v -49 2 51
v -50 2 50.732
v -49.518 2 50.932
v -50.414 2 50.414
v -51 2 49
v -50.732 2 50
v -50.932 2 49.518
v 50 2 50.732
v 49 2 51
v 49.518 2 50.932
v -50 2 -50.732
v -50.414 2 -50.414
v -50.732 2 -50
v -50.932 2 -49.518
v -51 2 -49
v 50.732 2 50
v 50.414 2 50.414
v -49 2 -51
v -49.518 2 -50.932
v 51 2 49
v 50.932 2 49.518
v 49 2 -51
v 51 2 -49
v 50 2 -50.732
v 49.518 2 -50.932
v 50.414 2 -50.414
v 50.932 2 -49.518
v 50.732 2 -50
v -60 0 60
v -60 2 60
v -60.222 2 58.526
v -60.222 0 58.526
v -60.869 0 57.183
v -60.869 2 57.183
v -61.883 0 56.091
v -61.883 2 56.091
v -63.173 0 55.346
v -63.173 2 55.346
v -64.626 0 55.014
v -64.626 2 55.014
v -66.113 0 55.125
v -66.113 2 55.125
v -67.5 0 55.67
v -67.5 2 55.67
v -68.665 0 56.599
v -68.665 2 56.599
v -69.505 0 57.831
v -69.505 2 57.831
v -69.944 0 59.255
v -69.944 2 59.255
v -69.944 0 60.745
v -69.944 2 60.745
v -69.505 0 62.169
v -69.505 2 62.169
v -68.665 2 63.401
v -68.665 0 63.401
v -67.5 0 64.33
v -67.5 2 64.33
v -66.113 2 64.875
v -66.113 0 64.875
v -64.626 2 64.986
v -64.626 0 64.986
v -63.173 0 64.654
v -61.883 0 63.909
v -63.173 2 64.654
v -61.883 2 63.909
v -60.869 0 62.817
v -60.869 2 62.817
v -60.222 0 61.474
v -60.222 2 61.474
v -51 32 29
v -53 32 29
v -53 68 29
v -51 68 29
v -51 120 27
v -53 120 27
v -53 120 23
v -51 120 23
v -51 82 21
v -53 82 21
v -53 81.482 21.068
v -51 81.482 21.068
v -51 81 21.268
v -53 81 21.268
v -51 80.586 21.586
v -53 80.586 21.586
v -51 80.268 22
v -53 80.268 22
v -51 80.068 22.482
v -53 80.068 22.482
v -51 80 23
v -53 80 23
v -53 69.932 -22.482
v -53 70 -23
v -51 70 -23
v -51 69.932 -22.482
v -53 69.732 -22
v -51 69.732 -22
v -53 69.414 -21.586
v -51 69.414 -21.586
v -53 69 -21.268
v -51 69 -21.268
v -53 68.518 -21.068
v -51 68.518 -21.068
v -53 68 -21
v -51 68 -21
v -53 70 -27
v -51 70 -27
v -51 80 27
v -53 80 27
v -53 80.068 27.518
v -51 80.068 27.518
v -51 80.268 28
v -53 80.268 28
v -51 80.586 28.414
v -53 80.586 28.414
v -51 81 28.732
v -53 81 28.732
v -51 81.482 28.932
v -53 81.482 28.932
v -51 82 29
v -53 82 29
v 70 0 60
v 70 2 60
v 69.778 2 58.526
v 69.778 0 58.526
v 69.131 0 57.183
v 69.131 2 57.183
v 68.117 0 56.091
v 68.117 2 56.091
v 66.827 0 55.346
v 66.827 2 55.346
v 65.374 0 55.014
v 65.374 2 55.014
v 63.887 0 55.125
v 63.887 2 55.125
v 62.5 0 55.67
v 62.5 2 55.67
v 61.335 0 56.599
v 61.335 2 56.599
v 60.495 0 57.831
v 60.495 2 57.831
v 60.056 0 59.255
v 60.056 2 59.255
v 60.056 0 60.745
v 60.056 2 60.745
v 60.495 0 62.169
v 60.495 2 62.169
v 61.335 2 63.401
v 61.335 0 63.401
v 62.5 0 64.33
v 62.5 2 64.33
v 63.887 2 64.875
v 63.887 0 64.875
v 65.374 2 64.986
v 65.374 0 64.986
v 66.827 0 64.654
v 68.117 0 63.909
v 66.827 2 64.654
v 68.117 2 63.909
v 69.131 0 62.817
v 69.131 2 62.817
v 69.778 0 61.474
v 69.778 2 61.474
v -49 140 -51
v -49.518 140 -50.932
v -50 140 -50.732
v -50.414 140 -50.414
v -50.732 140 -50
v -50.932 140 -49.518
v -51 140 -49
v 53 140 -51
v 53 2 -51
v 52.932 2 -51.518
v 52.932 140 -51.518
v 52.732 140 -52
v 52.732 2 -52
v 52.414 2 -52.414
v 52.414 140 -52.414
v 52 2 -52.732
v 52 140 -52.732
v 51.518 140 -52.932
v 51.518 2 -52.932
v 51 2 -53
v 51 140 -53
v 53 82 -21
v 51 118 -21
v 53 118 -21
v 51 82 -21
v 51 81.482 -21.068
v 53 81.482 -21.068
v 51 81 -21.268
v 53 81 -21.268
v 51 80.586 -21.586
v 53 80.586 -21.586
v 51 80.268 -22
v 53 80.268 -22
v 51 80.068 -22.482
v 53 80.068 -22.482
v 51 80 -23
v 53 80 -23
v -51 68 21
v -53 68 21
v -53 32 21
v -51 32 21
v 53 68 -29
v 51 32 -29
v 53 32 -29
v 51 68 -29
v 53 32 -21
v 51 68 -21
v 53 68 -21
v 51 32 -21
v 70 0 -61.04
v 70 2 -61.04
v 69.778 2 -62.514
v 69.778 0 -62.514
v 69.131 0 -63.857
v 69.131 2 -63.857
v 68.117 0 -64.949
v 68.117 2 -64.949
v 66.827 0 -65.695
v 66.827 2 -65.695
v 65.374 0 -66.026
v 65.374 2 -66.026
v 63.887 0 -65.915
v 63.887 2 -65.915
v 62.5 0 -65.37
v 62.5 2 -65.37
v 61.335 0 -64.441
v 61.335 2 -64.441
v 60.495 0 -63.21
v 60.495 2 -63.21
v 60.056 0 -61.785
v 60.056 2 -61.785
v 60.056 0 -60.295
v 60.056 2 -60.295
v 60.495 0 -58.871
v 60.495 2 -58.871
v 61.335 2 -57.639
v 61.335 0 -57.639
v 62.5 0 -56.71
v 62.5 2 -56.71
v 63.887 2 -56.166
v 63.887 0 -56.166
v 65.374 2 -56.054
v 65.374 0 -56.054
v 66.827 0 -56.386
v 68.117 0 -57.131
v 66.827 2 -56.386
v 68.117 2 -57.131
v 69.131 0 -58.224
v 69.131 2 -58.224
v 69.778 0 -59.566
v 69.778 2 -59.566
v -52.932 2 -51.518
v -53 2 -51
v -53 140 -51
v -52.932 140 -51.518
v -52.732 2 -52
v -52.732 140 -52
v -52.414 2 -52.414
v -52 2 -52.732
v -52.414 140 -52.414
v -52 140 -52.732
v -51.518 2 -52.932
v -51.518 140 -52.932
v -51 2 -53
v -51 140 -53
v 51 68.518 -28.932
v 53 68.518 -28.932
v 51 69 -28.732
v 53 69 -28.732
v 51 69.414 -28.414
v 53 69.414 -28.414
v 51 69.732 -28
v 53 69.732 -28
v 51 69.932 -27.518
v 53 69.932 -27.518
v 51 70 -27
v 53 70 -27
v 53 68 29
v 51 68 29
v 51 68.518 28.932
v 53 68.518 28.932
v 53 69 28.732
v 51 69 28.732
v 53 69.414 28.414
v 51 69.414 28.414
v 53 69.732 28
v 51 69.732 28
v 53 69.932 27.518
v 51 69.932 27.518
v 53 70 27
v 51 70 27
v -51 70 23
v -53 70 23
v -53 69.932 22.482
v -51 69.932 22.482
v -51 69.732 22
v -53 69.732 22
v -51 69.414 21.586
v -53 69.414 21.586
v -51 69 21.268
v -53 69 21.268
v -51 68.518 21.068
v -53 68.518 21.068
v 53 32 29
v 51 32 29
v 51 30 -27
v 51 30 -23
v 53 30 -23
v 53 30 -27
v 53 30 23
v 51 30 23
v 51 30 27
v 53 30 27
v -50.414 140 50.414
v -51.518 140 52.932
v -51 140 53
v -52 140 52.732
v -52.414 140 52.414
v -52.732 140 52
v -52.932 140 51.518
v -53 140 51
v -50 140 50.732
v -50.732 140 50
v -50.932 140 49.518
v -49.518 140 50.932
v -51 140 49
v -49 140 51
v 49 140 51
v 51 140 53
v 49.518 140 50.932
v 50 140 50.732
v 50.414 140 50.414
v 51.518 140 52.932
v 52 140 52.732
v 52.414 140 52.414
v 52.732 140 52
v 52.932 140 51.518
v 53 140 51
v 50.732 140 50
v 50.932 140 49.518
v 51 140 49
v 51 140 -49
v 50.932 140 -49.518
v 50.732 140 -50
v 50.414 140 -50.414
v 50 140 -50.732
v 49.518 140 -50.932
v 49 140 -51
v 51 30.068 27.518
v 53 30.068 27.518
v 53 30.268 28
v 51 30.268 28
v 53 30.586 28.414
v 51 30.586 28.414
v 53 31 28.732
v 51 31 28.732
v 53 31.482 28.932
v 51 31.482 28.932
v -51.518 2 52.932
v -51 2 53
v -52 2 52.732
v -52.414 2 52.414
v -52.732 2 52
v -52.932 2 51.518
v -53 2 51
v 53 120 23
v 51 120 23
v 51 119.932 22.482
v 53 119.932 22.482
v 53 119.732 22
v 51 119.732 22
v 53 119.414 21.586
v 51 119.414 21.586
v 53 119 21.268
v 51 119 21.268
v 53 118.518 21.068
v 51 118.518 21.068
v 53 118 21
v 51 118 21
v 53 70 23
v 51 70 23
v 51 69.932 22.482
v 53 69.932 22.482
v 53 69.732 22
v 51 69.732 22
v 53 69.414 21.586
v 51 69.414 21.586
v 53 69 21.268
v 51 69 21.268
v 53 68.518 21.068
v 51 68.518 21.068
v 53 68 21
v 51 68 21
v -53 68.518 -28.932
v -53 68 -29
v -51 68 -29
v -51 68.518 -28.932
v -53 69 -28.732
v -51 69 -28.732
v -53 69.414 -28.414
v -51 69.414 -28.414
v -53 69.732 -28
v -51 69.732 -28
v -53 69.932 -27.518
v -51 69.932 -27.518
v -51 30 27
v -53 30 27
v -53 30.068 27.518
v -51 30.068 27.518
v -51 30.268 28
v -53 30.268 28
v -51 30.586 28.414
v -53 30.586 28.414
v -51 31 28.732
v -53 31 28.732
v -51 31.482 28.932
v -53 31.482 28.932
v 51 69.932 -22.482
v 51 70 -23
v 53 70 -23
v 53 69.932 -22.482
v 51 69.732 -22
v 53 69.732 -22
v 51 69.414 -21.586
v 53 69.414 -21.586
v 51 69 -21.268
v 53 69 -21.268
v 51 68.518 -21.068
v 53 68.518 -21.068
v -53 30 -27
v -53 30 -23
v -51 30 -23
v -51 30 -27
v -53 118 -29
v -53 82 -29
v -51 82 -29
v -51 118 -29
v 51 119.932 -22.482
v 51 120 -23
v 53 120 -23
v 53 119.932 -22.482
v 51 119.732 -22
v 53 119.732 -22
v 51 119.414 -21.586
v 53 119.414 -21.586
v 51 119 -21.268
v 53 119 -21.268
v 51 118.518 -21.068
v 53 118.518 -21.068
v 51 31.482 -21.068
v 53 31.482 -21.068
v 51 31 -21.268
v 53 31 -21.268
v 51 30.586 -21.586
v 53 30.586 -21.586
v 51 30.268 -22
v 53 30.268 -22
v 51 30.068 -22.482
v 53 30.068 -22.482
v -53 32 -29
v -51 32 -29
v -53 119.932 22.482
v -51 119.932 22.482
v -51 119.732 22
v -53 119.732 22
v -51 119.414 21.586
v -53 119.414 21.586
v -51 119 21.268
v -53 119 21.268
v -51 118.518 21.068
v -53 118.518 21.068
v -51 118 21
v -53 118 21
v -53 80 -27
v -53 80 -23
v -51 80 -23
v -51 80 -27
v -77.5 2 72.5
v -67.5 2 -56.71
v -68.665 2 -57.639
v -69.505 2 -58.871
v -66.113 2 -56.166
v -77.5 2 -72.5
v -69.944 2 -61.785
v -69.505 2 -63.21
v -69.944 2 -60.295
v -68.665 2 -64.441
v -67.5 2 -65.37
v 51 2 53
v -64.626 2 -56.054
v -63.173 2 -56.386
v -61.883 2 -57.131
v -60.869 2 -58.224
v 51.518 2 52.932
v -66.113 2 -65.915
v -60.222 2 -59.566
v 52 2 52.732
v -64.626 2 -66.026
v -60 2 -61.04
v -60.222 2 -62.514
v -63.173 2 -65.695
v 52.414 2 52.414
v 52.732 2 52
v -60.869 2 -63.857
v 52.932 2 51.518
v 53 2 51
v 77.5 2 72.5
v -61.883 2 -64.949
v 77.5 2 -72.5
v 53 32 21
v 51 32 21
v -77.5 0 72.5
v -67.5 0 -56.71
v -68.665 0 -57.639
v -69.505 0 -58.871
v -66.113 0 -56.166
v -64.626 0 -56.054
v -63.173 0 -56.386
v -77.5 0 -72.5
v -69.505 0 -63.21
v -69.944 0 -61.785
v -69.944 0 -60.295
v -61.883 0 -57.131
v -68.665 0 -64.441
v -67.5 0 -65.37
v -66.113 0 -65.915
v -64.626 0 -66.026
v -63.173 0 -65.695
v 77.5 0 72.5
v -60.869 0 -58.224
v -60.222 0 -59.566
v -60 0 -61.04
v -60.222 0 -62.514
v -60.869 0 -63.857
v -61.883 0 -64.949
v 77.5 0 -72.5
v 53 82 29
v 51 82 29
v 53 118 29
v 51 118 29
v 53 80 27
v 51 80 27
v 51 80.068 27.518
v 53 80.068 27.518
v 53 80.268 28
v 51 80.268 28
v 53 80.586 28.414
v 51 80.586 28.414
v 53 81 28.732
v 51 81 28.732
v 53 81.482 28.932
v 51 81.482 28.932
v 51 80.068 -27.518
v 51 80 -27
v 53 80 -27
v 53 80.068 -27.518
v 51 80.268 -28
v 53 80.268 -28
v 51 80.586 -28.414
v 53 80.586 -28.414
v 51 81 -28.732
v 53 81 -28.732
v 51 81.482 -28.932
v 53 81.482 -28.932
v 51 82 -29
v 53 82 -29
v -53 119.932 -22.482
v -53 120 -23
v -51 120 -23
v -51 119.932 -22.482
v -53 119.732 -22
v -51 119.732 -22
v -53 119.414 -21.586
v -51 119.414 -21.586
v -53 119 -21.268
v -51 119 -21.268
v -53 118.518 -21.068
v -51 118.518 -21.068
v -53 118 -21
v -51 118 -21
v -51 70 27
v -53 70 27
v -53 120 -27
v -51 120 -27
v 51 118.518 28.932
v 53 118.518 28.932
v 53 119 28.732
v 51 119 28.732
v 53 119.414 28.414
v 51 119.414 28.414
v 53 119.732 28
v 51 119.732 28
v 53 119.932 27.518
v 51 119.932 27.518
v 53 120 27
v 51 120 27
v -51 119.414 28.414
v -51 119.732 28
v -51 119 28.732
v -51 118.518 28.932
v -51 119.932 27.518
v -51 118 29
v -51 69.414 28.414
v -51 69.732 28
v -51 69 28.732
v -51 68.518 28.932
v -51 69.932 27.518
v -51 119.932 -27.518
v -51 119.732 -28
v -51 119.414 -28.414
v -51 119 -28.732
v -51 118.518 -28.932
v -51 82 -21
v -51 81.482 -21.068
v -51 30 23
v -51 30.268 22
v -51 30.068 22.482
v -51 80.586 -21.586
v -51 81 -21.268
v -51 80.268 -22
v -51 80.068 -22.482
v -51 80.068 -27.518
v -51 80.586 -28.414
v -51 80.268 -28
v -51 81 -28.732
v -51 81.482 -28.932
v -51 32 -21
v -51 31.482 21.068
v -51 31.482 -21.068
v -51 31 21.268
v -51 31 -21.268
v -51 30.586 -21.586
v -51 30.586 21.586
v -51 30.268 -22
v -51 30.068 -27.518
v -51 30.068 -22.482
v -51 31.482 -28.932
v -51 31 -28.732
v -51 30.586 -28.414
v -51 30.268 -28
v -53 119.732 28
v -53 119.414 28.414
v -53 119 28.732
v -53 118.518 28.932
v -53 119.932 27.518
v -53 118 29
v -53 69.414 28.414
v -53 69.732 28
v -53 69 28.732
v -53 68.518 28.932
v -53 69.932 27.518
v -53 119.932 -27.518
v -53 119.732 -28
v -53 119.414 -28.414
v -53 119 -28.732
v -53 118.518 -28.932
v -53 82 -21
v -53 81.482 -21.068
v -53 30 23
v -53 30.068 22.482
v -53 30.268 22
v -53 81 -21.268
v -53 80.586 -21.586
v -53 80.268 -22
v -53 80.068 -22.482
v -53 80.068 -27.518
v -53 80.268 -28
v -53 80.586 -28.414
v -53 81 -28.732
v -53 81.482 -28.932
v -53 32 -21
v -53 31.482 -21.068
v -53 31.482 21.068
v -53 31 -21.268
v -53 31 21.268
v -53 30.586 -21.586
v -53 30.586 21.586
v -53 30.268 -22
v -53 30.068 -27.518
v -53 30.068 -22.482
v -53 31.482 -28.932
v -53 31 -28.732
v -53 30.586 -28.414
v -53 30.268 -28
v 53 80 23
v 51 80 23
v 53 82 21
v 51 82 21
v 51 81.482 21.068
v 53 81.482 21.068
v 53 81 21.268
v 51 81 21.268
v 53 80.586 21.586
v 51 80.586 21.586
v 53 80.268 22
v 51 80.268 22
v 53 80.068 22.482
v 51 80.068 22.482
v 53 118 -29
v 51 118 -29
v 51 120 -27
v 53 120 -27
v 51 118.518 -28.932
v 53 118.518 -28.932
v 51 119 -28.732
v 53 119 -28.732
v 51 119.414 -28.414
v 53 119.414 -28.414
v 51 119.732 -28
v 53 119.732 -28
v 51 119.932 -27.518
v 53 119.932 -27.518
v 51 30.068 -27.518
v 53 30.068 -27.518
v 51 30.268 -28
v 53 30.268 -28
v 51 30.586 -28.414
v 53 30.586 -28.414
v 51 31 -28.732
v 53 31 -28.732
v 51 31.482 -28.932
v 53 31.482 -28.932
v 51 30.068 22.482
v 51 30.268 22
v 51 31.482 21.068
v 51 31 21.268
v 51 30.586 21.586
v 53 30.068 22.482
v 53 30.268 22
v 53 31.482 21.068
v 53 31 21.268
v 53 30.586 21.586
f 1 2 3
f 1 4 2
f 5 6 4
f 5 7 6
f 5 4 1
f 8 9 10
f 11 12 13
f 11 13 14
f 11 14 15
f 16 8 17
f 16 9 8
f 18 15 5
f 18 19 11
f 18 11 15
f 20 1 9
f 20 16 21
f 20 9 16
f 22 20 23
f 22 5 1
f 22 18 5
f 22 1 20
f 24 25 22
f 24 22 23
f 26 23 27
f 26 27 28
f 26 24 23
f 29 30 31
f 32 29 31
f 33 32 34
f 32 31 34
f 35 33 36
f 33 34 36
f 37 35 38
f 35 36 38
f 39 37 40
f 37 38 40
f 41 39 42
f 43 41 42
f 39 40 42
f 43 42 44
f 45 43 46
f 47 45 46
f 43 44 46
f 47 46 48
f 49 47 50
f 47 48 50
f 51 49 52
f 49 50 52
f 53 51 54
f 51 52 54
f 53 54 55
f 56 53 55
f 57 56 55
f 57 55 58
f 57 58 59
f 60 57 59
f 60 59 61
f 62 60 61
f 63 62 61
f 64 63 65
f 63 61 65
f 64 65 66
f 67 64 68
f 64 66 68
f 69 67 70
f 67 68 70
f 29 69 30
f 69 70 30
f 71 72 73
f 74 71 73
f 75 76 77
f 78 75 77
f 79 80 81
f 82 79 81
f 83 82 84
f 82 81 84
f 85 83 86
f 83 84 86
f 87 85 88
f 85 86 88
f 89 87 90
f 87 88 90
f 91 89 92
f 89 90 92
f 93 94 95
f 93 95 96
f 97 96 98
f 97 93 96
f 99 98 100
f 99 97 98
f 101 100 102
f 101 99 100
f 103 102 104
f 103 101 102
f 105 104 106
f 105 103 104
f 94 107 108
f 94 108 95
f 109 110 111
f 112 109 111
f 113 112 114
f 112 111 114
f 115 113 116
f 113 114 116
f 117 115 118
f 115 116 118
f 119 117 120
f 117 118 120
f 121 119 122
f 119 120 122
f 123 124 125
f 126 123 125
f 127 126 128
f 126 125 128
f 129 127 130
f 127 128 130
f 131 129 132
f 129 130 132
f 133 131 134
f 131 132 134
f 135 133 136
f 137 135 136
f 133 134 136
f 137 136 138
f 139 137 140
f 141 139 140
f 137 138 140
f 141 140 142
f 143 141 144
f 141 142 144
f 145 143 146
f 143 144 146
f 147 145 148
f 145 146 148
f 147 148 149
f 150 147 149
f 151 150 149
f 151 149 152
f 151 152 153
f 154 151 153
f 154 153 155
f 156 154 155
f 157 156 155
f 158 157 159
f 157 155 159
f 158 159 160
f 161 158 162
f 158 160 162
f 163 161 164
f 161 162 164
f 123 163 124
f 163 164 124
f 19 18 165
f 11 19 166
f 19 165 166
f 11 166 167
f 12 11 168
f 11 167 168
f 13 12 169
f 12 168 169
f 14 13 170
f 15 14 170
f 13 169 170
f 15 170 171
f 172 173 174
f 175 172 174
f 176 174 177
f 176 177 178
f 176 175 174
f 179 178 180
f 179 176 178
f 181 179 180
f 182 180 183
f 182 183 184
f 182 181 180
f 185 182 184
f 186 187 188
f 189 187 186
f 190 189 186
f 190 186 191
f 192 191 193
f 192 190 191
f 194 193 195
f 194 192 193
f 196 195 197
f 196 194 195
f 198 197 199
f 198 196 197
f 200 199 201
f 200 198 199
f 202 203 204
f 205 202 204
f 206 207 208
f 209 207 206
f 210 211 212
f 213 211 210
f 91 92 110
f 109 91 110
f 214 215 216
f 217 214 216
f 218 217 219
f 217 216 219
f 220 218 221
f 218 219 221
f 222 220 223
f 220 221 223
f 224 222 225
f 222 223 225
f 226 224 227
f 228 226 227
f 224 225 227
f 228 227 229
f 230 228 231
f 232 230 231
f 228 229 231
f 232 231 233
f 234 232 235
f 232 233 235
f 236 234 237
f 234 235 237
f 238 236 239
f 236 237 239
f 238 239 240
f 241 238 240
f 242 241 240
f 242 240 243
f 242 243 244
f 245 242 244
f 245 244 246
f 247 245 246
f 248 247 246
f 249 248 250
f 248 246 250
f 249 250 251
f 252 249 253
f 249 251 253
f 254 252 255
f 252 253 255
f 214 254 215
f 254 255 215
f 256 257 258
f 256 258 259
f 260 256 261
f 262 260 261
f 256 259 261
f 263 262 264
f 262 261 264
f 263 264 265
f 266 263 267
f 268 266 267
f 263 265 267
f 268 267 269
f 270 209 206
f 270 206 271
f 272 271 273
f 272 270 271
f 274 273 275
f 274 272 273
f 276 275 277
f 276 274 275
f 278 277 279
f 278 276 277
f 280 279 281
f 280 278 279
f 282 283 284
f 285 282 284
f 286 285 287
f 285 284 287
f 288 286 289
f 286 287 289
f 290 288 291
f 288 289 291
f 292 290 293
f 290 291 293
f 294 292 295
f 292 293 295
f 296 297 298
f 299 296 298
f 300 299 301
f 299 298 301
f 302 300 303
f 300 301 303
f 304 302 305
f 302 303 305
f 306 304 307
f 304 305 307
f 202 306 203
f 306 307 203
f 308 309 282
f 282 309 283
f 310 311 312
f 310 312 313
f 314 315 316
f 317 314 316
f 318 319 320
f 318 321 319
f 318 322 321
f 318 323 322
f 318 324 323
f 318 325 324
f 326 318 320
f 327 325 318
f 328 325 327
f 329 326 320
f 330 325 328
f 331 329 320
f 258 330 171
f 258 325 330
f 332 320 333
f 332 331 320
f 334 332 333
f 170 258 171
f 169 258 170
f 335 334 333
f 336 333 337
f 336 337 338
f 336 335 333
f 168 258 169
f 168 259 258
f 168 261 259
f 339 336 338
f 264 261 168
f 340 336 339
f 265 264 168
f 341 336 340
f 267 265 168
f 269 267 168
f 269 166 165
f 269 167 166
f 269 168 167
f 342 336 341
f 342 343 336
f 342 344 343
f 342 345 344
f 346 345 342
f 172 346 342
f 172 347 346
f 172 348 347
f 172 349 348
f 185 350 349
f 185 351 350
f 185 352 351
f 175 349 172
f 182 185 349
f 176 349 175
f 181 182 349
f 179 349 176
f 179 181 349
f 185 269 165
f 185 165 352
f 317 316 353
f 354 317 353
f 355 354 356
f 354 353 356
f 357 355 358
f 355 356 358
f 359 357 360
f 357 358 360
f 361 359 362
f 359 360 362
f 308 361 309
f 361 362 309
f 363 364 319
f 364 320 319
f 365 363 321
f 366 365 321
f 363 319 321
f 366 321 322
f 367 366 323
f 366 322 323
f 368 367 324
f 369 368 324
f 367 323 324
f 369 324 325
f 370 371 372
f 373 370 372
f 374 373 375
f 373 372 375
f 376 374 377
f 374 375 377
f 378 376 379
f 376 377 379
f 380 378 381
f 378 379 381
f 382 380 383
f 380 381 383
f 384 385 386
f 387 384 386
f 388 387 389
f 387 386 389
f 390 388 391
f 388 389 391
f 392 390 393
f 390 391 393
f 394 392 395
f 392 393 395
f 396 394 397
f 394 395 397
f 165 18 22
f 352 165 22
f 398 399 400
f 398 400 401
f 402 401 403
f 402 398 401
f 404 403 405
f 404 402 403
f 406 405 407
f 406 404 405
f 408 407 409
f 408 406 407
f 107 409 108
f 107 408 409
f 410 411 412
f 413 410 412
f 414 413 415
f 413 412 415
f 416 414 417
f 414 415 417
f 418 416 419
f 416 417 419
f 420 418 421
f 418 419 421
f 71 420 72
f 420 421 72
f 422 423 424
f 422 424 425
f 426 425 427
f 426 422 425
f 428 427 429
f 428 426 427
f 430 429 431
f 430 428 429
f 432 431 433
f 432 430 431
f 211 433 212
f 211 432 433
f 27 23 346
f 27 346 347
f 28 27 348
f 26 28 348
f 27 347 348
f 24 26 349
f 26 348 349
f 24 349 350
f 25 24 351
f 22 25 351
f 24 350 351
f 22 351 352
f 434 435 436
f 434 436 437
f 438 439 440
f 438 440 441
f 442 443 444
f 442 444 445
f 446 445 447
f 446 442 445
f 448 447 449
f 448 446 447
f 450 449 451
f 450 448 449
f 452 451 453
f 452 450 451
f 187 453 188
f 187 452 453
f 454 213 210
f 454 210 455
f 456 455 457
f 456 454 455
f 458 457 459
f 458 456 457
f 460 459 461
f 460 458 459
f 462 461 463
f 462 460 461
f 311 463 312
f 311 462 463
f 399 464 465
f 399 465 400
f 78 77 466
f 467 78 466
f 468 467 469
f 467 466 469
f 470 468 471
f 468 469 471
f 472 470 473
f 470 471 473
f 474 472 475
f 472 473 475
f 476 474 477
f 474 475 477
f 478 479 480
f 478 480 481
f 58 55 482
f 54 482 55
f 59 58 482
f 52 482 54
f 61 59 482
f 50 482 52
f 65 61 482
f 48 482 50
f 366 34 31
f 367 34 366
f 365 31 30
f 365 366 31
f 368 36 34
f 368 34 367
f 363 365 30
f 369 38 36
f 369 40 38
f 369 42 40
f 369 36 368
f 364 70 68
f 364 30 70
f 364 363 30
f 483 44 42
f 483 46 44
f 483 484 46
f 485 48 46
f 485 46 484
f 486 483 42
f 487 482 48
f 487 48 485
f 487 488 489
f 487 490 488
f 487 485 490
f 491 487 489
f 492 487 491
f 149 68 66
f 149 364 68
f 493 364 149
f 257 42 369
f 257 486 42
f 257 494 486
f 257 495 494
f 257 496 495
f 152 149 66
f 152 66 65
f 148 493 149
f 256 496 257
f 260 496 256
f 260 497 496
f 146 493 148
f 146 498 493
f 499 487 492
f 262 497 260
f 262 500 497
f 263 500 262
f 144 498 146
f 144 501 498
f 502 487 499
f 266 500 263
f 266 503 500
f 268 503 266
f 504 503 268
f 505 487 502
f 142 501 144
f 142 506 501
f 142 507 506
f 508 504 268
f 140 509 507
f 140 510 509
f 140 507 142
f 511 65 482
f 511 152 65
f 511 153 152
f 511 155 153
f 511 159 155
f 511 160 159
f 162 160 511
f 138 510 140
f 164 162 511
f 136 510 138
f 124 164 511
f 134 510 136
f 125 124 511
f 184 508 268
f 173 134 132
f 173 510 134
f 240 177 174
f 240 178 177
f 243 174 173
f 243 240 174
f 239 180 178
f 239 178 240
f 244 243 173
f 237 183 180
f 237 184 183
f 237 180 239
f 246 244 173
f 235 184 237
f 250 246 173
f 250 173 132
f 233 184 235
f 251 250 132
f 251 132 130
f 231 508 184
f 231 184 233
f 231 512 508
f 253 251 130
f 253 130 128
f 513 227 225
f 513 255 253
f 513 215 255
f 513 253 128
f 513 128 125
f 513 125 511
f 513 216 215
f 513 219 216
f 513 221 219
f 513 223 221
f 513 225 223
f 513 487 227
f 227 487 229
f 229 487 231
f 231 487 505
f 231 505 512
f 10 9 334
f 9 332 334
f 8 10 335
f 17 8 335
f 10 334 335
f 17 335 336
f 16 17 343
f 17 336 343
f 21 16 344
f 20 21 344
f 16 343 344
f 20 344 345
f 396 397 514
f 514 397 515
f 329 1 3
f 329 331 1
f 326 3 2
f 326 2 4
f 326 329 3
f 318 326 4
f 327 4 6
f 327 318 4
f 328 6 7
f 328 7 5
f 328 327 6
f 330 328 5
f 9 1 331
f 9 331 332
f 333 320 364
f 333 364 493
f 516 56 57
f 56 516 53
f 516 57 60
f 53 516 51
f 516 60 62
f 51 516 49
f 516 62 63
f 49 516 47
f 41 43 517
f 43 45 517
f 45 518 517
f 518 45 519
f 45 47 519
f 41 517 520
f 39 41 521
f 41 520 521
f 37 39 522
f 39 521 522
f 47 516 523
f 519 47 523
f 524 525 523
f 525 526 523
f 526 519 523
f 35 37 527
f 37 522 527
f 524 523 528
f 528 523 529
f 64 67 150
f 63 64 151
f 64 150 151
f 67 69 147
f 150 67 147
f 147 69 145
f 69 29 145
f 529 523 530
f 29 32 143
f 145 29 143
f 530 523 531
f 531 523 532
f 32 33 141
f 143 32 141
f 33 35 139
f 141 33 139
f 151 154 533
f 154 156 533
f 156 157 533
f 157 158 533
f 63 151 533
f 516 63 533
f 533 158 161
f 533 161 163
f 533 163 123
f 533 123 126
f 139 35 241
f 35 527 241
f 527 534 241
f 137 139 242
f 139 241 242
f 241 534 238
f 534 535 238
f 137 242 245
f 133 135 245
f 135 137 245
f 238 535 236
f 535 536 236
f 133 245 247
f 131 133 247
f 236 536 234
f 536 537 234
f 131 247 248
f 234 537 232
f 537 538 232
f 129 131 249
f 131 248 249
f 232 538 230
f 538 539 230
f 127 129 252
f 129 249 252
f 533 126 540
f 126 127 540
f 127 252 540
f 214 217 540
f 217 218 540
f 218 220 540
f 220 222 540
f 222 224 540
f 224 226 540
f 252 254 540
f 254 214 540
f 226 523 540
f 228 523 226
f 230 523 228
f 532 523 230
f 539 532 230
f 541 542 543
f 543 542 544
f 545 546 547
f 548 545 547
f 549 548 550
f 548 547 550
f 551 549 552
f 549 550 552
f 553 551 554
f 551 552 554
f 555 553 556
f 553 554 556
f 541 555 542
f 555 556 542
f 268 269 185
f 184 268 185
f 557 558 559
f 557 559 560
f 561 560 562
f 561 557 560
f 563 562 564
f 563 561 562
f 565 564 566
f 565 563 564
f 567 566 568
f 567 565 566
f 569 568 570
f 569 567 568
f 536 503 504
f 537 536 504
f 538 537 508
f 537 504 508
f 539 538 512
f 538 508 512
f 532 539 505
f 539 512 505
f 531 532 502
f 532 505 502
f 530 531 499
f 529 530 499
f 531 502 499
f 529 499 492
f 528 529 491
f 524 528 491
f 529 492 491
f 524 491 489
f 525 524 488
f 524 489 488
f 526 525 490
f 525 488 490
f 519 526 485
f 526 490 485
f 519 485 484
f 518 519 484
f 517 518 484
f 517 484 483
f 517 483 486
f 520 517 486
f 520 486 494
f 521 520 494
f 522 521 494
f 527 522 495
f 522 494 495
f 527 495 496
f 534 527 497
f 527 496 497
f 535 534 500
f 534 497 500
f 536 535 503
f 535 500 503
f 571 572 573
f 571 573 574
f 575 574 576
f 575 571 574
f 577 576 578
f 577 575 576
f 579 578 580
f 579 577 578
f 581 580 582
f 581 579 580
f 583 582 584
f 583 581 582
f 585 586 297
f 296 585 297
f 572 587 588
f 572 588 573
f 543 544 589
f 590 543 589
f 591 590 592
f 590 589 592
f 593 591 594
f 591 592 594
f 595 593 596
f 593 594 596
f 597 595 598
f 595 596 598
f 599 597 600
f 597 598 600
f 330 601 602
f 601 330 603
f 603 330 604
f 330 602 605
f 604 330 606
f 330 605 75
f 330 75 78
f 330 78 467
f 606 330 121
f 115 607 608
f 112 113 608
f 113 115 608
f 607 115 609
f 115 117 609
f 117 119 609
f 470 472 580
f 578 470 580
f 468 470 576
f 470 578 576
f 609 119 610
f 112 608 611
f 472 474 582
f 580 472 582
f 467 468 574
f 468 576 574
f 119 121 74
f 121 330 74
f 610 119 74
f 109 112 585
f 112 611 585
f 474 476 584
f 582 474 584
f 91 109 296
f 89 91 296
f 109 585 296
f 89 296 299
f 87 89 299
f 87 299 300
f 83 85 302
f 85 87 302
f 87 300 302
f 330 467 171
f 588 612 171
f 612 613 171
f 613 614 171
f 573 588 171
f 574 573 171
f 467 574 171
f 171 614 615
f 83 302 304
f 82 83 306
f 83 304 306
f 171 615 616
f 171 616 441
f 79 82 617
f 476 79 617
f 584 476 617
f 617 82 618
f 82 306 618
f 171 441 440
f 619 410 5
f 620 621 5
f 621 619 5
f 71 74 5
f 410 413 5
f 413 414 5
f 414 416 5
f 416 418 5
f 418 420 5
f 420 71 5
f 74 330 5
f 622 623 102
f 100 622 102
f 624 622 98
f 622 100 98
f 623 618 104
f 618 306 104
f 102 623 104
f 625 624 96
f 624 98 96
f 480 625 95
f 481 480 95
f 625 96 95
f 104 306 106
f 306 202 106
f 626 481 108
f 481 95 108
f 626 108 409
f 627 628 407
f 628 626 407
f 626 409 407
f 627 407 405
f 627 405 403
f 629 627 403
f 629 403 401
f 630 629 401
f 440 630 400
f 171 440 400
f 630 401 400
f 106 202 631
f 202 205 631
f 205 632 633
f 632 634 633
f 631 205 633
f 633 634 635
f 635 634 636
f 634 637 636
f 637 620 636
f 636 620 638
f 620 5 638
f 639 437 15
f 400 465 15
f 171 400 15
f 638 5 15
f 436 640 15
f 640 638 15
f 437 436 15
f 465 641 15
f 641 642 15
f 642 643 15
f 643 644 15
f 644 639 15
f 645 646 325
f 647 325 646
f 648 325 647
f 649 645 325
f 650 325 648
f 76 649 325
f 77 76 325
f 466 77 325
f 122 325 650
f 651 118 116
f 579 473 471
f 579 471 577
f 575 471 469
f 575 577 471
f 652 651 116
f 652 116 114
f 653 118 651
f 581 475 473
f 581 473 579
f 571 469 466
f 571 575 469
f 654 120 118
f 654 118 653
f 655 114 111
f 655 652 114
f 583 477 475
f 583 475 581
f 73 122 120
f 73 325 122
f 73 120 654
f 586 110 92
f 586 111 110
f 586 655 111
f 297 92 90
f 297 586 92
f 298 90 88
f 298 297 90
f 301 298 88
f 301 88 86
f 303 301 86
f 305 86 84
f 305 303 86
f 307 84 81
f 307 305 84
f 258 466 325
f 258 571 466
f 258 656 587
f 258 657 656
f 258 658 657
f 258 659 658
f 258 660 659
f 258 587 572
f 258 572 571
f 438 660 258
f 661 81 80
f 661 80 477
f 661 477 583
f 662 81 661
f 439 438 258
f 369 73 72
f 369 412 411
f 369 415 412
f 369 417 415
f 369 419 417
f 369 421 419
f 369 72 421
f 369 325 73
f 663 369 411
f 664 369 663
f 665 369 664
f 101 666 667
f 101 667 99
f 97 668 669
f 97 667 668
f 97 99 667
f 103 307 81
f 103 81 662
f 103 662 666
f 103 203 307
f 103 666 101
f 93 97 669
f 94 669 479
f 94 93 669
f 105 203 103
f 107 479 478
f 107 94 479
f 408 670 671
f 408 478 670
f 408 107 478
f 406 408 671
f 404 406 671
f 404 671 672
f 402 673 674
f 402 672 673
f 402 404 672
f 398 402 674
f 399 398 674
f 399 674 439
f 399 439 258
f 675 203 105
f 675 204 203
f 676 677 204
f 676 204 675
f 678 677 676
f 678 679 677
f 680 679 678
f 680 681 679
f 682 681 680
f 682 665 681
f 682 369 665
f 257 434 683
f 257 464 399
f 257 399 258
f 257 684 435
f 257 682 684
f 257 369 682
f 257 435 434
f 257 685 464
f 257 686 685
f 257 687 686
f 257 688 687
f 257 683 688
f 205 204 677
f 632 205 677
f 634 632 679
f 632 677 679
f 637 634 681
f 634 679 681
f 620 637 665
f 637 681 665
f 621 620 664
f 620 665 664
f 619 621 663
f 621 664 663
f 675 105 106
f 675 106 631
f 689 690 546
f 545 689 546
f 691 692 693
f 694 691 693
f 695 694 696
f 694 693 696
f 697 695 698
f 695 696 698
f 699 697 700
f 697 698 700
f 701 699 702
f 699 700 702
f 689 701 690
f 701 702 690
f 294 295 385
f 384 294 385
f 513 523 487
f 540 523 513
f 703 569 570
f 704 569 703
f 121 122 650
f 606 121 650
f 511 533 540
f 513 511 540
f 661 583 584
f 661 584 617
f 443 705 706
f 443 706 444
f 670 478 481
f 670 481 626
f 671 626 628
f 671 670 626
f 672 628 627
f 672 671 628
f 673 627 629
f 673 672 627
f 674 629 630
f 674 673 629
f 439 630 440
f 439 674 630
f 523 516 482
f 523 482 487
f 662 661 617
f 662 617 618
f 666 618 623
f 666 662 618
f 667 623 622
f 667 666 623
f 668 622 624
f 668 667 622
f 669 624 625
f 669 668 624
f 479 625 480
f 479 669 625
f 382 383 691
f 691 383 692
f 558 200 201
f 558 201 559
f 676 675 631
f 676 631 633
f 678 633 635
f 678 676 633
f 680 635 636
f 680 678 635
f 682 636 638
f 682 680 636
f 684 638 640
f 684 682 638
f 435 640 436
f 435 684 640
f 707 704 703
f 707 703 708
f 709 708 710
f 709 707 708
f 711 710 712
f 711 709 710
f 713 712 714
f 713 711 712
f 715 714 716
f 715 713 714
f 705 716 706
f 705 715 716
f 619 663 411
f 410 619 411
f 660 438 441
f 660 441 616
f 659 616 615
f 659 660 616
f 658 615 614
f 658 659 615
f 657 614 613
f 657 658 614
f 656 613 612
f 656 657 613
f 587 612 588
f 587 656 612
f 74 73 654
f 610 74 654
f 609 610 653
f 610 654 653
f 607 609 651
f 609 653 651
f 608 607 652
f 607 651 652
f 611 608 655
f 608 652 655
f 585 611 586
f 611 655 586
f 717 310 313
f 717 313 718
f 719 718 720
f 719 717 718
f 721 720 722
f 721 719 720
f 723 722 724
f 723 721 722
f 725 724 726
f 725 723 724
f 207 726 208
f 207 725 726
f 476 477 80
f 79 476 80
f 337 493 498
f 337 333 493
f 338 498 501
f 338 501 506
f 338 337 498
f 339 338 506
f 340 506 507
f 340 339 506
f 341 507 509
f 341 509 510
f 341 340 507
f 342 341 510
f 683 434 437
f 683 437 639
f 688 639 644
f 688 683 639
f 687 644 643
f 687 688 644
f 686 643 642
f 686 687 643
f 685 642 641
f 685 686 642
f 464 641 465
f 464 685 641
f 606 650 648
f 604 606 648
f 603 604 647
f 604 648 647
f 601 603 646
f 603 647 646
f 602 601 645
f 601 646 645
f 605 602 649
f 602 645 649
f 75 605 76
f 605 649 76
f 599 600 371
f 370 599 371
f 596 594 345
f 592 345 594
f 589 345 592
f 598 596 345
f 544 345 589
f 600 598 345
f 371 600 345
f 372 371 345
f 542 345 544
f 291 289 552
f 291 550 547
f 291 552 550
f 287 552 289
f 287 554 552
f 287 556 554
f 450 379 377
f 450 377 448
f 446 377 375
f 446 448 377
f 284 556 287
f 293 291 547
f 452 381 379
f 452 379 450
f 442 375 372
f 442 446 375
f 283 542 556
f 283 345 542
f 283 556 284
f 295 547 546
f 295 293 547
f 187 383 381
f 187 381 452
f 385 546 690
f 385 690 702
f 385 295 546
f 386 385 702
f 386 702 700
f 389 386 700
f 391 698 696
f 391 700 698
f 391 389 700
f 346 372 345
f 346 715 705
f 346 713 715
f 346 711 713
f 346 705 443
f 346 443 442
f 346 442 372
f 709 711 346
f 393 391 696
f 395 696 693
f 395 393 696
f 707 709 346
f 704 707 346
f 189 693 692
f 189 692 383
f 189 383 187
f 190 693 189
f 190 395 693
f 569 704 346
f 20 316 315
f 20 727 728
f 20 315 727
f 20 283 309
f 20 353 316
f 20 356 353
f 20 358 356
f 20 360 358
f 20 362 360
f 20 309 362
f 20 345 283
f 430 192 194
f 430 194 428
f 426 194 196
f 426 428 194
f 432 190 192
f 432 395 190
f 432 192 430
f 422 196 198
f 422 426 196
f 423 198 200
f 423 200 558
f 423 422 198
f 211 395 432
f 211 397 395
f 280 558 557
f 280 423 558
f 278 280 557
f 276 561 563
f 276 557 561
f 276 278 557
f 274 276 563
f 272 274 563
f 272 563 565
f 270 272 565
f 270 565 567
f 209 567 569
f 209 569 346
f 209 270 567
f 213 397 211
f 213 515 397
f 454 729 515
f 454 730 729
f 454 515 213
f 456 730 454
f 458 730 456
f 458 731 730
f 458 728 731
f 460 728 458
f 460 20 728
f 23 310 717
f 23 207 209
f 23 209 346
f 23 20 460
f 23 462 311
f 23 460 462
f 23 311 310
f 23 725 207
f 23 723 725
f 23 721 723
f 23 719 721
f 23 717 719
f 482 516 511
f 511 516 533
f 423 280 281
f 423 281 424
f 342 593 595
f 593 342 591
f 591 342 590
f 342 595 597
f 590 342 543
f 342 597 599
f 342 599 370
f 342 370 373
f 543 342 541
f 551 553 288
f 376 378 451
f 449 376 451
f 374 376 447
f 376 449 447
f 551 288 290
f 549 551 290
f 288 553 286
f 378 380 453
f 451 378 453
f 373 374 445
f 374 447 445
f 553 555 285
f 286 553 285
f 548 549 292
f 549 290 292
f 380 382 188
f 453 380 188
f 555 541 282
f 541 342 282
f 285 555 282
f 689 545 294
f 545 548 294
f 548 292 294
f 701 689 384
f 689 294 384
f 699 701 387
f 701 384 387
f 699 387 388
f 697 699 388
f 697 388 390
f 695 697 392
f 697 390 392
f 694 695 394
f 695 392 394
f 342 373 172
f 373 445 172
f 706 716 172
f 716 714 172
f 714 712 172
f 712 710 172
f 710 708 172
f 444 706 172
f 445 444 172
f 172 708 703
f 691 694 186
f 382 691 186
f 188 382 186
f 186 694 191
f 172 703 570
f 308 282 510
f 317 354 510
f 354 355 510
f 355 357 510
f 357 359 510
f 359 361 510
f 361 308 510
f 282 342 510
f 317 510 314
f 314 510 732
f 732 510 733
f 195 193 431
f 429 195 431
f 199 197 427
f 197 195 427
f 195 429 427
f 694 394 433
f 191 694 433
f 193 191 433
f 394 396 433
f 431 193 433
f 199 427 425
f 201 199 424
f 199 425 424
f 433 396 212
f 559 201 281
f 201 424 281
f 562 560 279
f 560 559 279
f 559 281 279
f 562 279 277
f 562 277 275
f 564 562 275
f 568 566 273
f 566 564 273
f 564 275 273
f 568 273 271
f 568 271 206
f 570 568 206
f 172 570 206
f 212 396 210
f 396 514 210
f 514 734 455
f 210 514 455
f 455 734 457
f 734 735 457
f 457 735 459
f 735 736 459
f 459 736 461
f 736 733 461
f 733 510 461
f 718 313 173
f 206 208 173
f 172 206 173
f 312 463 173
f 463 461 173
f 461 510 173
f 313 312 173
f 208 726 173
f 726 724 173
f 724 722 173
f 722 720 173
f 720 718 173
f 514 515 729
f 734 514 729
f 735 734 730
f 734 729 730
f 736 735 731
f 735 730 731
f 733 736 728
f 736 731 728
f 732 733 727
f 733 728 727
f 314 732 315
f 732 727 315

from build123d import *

# Parameters (mm, degrees)
SKETCH1_W              = 106
SKETCH1_H              = 106
SKETCH1_W_2            = 102
SKETCH1_H_2            = 102
BOSS_EXTRUDE1_DEPTH    = 140
SKETCH2_W              = 155
SKETCH2_H              = 145
BOSS_EXTRUDE2_DEPTH    = 2
SKETCH3_R              = 5
CUT_EXTRUDE1_DEPTH     = 2
CUT_EXTRUDE2_START     = -131.5
CUT_EXTRUDE2_DEPTH     = 157
LPATTERN1_COUNT        = 2
LPATTERN1_PITCH        = 50
LPATTERN1_START        = -131.5
LPATTERN1_COPY_1_DEPTH = 157
FILLET1_R              = 2


with BuildPart() as part:
    # Sketch1 → Boss-Extrude1 (new body)
    with BuildSketch(Plane(origin=(0, 0, 0), x_dir=(1, 0, 0), z_dir=(0, 1, 0))):
        Rectangle(SKETCH1_W, SKETCH1_H)
        Rectangle(SKETCH1_W_2, SKETCH1_H_2, mode=Mode.SUBTRACT)
    extrude(amount=BOSS_EXTRUDE1_DEPTH)

    # Sketch2 → Boss-Extrude2 (add)
    with BuildSketch(Plane(origin=(0, 0, 0), x_dir=(1, 0, 0), z_dir=(0, 1, 0))):
        Rectangle(SKETCH2_W, SKETCH2_H)
    extrude(amount=BOSS_EXTRUDE2_DEPTH)

    # Sketch3 → Cut-Extrude1 (cut)
    with BuildSketch(Plane(origin=(0, 2, 0), x_dir=(1, 0, 0), z_dir=(0, 1, 0))):
        with Locations((-65, 61.040230774)):
            Circle(SKETCH3_R)
        with Locations((65, 61.040230774)):
            Circle(SKETCH3_R)
        with Locations((65, -60)):
            Circle(SKETCH3_R)
        with Locations((-65, -60)):
            Circle(SKETCH3_R)
    extrude(amount=-CUT_EXTRUDE1_DEPTH, mode=Mode.SUBTRACT)

    # Sketch4 → Cut-Extrude2 (cut)
    with BuildSketch(Plane(origin=(53, 0, 0), x_dir=(0, 0, -1), z_dir=(1, 0, 0)).offset(CUT_EXTRUDE2_START)):
        with BuildLine():
            Line((-23, 80), (-27, 80))
            ThreePointArc((-27, 80), (-28.414213562, 80.585786438), (-29, 82))
            Line((-29, 82), (-29, 118))
            ThreePointArc((-29, 118), (-28.414213562, 119.414213562), (-27, 120))
            Line((-27, 120), (-23, 120))
            ThreePointArc((-23, 120), (-21.585786438, 119.414213562), (-21, 118))
            Line((-21, 118), (-21, 82))
            ThreePointArc((-21, 82), (-21.585786438, 80.585786438), (-23, 80))
        make_face()
    cut_extrude2 = extrude(amount=CUT_EXTRUDE2_DEPTH, mode=Mode.SUBTRACT)

    # Mirror1: Cut-Extrude2 across plane
    add(cut_extrude2.mirror(Plane.XY), mode=Mode.SUBTRACT)

    # LPattern1: Cut-Extrude2 ×2
    with Locations(*[(0, -i * LPATTERN1_PITCH, 0) for i in range(1, LPATTERN1_COUNT)]):
        add(cut_extrude2, mode=Mode.SUBTRACT)

    # LPattern1 copy 1 sketch → LPattern1 copy 1 (cut)
    with BuildSketch(Plane(origin=(53, -50, 0), x_dir=(0, 0, 1), z_dir=(1, 0, 0)).offset(LPATTERN1_START)):
        with BuildLine():
            Line((-23, -80), (-27, -80))
            ThreePointArc((-27, -80), (-28.414213562, -80.585786438), (-29, -82))
            Line((-29, -82), (-29, -118))
            ThreePointArc((-29, -118), (-28.414213562, -119.414213562), (-27, -120))
            Line((-27, -120), (-23, -120))
            ThreePointArc((-23, -120), (-21.585786438, -119.414213562), (-21, -118))
            Line((-21, -118), (-21, -82))
            ThreePointArc((-21, -82), (-21.585786438, -80.585786438), (-23, -80))
        make_face()
    extrude(amount=LPATTERN1_COPY_1_DEPTH, mode=Mode.SUBTRACT)

    # Fillet1
    fillet1_edges = [part.edges().sort_by_distance(p)[0] for p in [
        (-51, 71, -51),
        (-51, 71, 51),
        (51, 71, 51),
        (51, 71, -51),
        (-53, 71, -53),
        (53, 71, -53),
        (53, 71, 53),
        (-53, 71, 53),
    ]]
    fillet(fillet1_edges, radius=FILLET1_R)


solid = part.part
